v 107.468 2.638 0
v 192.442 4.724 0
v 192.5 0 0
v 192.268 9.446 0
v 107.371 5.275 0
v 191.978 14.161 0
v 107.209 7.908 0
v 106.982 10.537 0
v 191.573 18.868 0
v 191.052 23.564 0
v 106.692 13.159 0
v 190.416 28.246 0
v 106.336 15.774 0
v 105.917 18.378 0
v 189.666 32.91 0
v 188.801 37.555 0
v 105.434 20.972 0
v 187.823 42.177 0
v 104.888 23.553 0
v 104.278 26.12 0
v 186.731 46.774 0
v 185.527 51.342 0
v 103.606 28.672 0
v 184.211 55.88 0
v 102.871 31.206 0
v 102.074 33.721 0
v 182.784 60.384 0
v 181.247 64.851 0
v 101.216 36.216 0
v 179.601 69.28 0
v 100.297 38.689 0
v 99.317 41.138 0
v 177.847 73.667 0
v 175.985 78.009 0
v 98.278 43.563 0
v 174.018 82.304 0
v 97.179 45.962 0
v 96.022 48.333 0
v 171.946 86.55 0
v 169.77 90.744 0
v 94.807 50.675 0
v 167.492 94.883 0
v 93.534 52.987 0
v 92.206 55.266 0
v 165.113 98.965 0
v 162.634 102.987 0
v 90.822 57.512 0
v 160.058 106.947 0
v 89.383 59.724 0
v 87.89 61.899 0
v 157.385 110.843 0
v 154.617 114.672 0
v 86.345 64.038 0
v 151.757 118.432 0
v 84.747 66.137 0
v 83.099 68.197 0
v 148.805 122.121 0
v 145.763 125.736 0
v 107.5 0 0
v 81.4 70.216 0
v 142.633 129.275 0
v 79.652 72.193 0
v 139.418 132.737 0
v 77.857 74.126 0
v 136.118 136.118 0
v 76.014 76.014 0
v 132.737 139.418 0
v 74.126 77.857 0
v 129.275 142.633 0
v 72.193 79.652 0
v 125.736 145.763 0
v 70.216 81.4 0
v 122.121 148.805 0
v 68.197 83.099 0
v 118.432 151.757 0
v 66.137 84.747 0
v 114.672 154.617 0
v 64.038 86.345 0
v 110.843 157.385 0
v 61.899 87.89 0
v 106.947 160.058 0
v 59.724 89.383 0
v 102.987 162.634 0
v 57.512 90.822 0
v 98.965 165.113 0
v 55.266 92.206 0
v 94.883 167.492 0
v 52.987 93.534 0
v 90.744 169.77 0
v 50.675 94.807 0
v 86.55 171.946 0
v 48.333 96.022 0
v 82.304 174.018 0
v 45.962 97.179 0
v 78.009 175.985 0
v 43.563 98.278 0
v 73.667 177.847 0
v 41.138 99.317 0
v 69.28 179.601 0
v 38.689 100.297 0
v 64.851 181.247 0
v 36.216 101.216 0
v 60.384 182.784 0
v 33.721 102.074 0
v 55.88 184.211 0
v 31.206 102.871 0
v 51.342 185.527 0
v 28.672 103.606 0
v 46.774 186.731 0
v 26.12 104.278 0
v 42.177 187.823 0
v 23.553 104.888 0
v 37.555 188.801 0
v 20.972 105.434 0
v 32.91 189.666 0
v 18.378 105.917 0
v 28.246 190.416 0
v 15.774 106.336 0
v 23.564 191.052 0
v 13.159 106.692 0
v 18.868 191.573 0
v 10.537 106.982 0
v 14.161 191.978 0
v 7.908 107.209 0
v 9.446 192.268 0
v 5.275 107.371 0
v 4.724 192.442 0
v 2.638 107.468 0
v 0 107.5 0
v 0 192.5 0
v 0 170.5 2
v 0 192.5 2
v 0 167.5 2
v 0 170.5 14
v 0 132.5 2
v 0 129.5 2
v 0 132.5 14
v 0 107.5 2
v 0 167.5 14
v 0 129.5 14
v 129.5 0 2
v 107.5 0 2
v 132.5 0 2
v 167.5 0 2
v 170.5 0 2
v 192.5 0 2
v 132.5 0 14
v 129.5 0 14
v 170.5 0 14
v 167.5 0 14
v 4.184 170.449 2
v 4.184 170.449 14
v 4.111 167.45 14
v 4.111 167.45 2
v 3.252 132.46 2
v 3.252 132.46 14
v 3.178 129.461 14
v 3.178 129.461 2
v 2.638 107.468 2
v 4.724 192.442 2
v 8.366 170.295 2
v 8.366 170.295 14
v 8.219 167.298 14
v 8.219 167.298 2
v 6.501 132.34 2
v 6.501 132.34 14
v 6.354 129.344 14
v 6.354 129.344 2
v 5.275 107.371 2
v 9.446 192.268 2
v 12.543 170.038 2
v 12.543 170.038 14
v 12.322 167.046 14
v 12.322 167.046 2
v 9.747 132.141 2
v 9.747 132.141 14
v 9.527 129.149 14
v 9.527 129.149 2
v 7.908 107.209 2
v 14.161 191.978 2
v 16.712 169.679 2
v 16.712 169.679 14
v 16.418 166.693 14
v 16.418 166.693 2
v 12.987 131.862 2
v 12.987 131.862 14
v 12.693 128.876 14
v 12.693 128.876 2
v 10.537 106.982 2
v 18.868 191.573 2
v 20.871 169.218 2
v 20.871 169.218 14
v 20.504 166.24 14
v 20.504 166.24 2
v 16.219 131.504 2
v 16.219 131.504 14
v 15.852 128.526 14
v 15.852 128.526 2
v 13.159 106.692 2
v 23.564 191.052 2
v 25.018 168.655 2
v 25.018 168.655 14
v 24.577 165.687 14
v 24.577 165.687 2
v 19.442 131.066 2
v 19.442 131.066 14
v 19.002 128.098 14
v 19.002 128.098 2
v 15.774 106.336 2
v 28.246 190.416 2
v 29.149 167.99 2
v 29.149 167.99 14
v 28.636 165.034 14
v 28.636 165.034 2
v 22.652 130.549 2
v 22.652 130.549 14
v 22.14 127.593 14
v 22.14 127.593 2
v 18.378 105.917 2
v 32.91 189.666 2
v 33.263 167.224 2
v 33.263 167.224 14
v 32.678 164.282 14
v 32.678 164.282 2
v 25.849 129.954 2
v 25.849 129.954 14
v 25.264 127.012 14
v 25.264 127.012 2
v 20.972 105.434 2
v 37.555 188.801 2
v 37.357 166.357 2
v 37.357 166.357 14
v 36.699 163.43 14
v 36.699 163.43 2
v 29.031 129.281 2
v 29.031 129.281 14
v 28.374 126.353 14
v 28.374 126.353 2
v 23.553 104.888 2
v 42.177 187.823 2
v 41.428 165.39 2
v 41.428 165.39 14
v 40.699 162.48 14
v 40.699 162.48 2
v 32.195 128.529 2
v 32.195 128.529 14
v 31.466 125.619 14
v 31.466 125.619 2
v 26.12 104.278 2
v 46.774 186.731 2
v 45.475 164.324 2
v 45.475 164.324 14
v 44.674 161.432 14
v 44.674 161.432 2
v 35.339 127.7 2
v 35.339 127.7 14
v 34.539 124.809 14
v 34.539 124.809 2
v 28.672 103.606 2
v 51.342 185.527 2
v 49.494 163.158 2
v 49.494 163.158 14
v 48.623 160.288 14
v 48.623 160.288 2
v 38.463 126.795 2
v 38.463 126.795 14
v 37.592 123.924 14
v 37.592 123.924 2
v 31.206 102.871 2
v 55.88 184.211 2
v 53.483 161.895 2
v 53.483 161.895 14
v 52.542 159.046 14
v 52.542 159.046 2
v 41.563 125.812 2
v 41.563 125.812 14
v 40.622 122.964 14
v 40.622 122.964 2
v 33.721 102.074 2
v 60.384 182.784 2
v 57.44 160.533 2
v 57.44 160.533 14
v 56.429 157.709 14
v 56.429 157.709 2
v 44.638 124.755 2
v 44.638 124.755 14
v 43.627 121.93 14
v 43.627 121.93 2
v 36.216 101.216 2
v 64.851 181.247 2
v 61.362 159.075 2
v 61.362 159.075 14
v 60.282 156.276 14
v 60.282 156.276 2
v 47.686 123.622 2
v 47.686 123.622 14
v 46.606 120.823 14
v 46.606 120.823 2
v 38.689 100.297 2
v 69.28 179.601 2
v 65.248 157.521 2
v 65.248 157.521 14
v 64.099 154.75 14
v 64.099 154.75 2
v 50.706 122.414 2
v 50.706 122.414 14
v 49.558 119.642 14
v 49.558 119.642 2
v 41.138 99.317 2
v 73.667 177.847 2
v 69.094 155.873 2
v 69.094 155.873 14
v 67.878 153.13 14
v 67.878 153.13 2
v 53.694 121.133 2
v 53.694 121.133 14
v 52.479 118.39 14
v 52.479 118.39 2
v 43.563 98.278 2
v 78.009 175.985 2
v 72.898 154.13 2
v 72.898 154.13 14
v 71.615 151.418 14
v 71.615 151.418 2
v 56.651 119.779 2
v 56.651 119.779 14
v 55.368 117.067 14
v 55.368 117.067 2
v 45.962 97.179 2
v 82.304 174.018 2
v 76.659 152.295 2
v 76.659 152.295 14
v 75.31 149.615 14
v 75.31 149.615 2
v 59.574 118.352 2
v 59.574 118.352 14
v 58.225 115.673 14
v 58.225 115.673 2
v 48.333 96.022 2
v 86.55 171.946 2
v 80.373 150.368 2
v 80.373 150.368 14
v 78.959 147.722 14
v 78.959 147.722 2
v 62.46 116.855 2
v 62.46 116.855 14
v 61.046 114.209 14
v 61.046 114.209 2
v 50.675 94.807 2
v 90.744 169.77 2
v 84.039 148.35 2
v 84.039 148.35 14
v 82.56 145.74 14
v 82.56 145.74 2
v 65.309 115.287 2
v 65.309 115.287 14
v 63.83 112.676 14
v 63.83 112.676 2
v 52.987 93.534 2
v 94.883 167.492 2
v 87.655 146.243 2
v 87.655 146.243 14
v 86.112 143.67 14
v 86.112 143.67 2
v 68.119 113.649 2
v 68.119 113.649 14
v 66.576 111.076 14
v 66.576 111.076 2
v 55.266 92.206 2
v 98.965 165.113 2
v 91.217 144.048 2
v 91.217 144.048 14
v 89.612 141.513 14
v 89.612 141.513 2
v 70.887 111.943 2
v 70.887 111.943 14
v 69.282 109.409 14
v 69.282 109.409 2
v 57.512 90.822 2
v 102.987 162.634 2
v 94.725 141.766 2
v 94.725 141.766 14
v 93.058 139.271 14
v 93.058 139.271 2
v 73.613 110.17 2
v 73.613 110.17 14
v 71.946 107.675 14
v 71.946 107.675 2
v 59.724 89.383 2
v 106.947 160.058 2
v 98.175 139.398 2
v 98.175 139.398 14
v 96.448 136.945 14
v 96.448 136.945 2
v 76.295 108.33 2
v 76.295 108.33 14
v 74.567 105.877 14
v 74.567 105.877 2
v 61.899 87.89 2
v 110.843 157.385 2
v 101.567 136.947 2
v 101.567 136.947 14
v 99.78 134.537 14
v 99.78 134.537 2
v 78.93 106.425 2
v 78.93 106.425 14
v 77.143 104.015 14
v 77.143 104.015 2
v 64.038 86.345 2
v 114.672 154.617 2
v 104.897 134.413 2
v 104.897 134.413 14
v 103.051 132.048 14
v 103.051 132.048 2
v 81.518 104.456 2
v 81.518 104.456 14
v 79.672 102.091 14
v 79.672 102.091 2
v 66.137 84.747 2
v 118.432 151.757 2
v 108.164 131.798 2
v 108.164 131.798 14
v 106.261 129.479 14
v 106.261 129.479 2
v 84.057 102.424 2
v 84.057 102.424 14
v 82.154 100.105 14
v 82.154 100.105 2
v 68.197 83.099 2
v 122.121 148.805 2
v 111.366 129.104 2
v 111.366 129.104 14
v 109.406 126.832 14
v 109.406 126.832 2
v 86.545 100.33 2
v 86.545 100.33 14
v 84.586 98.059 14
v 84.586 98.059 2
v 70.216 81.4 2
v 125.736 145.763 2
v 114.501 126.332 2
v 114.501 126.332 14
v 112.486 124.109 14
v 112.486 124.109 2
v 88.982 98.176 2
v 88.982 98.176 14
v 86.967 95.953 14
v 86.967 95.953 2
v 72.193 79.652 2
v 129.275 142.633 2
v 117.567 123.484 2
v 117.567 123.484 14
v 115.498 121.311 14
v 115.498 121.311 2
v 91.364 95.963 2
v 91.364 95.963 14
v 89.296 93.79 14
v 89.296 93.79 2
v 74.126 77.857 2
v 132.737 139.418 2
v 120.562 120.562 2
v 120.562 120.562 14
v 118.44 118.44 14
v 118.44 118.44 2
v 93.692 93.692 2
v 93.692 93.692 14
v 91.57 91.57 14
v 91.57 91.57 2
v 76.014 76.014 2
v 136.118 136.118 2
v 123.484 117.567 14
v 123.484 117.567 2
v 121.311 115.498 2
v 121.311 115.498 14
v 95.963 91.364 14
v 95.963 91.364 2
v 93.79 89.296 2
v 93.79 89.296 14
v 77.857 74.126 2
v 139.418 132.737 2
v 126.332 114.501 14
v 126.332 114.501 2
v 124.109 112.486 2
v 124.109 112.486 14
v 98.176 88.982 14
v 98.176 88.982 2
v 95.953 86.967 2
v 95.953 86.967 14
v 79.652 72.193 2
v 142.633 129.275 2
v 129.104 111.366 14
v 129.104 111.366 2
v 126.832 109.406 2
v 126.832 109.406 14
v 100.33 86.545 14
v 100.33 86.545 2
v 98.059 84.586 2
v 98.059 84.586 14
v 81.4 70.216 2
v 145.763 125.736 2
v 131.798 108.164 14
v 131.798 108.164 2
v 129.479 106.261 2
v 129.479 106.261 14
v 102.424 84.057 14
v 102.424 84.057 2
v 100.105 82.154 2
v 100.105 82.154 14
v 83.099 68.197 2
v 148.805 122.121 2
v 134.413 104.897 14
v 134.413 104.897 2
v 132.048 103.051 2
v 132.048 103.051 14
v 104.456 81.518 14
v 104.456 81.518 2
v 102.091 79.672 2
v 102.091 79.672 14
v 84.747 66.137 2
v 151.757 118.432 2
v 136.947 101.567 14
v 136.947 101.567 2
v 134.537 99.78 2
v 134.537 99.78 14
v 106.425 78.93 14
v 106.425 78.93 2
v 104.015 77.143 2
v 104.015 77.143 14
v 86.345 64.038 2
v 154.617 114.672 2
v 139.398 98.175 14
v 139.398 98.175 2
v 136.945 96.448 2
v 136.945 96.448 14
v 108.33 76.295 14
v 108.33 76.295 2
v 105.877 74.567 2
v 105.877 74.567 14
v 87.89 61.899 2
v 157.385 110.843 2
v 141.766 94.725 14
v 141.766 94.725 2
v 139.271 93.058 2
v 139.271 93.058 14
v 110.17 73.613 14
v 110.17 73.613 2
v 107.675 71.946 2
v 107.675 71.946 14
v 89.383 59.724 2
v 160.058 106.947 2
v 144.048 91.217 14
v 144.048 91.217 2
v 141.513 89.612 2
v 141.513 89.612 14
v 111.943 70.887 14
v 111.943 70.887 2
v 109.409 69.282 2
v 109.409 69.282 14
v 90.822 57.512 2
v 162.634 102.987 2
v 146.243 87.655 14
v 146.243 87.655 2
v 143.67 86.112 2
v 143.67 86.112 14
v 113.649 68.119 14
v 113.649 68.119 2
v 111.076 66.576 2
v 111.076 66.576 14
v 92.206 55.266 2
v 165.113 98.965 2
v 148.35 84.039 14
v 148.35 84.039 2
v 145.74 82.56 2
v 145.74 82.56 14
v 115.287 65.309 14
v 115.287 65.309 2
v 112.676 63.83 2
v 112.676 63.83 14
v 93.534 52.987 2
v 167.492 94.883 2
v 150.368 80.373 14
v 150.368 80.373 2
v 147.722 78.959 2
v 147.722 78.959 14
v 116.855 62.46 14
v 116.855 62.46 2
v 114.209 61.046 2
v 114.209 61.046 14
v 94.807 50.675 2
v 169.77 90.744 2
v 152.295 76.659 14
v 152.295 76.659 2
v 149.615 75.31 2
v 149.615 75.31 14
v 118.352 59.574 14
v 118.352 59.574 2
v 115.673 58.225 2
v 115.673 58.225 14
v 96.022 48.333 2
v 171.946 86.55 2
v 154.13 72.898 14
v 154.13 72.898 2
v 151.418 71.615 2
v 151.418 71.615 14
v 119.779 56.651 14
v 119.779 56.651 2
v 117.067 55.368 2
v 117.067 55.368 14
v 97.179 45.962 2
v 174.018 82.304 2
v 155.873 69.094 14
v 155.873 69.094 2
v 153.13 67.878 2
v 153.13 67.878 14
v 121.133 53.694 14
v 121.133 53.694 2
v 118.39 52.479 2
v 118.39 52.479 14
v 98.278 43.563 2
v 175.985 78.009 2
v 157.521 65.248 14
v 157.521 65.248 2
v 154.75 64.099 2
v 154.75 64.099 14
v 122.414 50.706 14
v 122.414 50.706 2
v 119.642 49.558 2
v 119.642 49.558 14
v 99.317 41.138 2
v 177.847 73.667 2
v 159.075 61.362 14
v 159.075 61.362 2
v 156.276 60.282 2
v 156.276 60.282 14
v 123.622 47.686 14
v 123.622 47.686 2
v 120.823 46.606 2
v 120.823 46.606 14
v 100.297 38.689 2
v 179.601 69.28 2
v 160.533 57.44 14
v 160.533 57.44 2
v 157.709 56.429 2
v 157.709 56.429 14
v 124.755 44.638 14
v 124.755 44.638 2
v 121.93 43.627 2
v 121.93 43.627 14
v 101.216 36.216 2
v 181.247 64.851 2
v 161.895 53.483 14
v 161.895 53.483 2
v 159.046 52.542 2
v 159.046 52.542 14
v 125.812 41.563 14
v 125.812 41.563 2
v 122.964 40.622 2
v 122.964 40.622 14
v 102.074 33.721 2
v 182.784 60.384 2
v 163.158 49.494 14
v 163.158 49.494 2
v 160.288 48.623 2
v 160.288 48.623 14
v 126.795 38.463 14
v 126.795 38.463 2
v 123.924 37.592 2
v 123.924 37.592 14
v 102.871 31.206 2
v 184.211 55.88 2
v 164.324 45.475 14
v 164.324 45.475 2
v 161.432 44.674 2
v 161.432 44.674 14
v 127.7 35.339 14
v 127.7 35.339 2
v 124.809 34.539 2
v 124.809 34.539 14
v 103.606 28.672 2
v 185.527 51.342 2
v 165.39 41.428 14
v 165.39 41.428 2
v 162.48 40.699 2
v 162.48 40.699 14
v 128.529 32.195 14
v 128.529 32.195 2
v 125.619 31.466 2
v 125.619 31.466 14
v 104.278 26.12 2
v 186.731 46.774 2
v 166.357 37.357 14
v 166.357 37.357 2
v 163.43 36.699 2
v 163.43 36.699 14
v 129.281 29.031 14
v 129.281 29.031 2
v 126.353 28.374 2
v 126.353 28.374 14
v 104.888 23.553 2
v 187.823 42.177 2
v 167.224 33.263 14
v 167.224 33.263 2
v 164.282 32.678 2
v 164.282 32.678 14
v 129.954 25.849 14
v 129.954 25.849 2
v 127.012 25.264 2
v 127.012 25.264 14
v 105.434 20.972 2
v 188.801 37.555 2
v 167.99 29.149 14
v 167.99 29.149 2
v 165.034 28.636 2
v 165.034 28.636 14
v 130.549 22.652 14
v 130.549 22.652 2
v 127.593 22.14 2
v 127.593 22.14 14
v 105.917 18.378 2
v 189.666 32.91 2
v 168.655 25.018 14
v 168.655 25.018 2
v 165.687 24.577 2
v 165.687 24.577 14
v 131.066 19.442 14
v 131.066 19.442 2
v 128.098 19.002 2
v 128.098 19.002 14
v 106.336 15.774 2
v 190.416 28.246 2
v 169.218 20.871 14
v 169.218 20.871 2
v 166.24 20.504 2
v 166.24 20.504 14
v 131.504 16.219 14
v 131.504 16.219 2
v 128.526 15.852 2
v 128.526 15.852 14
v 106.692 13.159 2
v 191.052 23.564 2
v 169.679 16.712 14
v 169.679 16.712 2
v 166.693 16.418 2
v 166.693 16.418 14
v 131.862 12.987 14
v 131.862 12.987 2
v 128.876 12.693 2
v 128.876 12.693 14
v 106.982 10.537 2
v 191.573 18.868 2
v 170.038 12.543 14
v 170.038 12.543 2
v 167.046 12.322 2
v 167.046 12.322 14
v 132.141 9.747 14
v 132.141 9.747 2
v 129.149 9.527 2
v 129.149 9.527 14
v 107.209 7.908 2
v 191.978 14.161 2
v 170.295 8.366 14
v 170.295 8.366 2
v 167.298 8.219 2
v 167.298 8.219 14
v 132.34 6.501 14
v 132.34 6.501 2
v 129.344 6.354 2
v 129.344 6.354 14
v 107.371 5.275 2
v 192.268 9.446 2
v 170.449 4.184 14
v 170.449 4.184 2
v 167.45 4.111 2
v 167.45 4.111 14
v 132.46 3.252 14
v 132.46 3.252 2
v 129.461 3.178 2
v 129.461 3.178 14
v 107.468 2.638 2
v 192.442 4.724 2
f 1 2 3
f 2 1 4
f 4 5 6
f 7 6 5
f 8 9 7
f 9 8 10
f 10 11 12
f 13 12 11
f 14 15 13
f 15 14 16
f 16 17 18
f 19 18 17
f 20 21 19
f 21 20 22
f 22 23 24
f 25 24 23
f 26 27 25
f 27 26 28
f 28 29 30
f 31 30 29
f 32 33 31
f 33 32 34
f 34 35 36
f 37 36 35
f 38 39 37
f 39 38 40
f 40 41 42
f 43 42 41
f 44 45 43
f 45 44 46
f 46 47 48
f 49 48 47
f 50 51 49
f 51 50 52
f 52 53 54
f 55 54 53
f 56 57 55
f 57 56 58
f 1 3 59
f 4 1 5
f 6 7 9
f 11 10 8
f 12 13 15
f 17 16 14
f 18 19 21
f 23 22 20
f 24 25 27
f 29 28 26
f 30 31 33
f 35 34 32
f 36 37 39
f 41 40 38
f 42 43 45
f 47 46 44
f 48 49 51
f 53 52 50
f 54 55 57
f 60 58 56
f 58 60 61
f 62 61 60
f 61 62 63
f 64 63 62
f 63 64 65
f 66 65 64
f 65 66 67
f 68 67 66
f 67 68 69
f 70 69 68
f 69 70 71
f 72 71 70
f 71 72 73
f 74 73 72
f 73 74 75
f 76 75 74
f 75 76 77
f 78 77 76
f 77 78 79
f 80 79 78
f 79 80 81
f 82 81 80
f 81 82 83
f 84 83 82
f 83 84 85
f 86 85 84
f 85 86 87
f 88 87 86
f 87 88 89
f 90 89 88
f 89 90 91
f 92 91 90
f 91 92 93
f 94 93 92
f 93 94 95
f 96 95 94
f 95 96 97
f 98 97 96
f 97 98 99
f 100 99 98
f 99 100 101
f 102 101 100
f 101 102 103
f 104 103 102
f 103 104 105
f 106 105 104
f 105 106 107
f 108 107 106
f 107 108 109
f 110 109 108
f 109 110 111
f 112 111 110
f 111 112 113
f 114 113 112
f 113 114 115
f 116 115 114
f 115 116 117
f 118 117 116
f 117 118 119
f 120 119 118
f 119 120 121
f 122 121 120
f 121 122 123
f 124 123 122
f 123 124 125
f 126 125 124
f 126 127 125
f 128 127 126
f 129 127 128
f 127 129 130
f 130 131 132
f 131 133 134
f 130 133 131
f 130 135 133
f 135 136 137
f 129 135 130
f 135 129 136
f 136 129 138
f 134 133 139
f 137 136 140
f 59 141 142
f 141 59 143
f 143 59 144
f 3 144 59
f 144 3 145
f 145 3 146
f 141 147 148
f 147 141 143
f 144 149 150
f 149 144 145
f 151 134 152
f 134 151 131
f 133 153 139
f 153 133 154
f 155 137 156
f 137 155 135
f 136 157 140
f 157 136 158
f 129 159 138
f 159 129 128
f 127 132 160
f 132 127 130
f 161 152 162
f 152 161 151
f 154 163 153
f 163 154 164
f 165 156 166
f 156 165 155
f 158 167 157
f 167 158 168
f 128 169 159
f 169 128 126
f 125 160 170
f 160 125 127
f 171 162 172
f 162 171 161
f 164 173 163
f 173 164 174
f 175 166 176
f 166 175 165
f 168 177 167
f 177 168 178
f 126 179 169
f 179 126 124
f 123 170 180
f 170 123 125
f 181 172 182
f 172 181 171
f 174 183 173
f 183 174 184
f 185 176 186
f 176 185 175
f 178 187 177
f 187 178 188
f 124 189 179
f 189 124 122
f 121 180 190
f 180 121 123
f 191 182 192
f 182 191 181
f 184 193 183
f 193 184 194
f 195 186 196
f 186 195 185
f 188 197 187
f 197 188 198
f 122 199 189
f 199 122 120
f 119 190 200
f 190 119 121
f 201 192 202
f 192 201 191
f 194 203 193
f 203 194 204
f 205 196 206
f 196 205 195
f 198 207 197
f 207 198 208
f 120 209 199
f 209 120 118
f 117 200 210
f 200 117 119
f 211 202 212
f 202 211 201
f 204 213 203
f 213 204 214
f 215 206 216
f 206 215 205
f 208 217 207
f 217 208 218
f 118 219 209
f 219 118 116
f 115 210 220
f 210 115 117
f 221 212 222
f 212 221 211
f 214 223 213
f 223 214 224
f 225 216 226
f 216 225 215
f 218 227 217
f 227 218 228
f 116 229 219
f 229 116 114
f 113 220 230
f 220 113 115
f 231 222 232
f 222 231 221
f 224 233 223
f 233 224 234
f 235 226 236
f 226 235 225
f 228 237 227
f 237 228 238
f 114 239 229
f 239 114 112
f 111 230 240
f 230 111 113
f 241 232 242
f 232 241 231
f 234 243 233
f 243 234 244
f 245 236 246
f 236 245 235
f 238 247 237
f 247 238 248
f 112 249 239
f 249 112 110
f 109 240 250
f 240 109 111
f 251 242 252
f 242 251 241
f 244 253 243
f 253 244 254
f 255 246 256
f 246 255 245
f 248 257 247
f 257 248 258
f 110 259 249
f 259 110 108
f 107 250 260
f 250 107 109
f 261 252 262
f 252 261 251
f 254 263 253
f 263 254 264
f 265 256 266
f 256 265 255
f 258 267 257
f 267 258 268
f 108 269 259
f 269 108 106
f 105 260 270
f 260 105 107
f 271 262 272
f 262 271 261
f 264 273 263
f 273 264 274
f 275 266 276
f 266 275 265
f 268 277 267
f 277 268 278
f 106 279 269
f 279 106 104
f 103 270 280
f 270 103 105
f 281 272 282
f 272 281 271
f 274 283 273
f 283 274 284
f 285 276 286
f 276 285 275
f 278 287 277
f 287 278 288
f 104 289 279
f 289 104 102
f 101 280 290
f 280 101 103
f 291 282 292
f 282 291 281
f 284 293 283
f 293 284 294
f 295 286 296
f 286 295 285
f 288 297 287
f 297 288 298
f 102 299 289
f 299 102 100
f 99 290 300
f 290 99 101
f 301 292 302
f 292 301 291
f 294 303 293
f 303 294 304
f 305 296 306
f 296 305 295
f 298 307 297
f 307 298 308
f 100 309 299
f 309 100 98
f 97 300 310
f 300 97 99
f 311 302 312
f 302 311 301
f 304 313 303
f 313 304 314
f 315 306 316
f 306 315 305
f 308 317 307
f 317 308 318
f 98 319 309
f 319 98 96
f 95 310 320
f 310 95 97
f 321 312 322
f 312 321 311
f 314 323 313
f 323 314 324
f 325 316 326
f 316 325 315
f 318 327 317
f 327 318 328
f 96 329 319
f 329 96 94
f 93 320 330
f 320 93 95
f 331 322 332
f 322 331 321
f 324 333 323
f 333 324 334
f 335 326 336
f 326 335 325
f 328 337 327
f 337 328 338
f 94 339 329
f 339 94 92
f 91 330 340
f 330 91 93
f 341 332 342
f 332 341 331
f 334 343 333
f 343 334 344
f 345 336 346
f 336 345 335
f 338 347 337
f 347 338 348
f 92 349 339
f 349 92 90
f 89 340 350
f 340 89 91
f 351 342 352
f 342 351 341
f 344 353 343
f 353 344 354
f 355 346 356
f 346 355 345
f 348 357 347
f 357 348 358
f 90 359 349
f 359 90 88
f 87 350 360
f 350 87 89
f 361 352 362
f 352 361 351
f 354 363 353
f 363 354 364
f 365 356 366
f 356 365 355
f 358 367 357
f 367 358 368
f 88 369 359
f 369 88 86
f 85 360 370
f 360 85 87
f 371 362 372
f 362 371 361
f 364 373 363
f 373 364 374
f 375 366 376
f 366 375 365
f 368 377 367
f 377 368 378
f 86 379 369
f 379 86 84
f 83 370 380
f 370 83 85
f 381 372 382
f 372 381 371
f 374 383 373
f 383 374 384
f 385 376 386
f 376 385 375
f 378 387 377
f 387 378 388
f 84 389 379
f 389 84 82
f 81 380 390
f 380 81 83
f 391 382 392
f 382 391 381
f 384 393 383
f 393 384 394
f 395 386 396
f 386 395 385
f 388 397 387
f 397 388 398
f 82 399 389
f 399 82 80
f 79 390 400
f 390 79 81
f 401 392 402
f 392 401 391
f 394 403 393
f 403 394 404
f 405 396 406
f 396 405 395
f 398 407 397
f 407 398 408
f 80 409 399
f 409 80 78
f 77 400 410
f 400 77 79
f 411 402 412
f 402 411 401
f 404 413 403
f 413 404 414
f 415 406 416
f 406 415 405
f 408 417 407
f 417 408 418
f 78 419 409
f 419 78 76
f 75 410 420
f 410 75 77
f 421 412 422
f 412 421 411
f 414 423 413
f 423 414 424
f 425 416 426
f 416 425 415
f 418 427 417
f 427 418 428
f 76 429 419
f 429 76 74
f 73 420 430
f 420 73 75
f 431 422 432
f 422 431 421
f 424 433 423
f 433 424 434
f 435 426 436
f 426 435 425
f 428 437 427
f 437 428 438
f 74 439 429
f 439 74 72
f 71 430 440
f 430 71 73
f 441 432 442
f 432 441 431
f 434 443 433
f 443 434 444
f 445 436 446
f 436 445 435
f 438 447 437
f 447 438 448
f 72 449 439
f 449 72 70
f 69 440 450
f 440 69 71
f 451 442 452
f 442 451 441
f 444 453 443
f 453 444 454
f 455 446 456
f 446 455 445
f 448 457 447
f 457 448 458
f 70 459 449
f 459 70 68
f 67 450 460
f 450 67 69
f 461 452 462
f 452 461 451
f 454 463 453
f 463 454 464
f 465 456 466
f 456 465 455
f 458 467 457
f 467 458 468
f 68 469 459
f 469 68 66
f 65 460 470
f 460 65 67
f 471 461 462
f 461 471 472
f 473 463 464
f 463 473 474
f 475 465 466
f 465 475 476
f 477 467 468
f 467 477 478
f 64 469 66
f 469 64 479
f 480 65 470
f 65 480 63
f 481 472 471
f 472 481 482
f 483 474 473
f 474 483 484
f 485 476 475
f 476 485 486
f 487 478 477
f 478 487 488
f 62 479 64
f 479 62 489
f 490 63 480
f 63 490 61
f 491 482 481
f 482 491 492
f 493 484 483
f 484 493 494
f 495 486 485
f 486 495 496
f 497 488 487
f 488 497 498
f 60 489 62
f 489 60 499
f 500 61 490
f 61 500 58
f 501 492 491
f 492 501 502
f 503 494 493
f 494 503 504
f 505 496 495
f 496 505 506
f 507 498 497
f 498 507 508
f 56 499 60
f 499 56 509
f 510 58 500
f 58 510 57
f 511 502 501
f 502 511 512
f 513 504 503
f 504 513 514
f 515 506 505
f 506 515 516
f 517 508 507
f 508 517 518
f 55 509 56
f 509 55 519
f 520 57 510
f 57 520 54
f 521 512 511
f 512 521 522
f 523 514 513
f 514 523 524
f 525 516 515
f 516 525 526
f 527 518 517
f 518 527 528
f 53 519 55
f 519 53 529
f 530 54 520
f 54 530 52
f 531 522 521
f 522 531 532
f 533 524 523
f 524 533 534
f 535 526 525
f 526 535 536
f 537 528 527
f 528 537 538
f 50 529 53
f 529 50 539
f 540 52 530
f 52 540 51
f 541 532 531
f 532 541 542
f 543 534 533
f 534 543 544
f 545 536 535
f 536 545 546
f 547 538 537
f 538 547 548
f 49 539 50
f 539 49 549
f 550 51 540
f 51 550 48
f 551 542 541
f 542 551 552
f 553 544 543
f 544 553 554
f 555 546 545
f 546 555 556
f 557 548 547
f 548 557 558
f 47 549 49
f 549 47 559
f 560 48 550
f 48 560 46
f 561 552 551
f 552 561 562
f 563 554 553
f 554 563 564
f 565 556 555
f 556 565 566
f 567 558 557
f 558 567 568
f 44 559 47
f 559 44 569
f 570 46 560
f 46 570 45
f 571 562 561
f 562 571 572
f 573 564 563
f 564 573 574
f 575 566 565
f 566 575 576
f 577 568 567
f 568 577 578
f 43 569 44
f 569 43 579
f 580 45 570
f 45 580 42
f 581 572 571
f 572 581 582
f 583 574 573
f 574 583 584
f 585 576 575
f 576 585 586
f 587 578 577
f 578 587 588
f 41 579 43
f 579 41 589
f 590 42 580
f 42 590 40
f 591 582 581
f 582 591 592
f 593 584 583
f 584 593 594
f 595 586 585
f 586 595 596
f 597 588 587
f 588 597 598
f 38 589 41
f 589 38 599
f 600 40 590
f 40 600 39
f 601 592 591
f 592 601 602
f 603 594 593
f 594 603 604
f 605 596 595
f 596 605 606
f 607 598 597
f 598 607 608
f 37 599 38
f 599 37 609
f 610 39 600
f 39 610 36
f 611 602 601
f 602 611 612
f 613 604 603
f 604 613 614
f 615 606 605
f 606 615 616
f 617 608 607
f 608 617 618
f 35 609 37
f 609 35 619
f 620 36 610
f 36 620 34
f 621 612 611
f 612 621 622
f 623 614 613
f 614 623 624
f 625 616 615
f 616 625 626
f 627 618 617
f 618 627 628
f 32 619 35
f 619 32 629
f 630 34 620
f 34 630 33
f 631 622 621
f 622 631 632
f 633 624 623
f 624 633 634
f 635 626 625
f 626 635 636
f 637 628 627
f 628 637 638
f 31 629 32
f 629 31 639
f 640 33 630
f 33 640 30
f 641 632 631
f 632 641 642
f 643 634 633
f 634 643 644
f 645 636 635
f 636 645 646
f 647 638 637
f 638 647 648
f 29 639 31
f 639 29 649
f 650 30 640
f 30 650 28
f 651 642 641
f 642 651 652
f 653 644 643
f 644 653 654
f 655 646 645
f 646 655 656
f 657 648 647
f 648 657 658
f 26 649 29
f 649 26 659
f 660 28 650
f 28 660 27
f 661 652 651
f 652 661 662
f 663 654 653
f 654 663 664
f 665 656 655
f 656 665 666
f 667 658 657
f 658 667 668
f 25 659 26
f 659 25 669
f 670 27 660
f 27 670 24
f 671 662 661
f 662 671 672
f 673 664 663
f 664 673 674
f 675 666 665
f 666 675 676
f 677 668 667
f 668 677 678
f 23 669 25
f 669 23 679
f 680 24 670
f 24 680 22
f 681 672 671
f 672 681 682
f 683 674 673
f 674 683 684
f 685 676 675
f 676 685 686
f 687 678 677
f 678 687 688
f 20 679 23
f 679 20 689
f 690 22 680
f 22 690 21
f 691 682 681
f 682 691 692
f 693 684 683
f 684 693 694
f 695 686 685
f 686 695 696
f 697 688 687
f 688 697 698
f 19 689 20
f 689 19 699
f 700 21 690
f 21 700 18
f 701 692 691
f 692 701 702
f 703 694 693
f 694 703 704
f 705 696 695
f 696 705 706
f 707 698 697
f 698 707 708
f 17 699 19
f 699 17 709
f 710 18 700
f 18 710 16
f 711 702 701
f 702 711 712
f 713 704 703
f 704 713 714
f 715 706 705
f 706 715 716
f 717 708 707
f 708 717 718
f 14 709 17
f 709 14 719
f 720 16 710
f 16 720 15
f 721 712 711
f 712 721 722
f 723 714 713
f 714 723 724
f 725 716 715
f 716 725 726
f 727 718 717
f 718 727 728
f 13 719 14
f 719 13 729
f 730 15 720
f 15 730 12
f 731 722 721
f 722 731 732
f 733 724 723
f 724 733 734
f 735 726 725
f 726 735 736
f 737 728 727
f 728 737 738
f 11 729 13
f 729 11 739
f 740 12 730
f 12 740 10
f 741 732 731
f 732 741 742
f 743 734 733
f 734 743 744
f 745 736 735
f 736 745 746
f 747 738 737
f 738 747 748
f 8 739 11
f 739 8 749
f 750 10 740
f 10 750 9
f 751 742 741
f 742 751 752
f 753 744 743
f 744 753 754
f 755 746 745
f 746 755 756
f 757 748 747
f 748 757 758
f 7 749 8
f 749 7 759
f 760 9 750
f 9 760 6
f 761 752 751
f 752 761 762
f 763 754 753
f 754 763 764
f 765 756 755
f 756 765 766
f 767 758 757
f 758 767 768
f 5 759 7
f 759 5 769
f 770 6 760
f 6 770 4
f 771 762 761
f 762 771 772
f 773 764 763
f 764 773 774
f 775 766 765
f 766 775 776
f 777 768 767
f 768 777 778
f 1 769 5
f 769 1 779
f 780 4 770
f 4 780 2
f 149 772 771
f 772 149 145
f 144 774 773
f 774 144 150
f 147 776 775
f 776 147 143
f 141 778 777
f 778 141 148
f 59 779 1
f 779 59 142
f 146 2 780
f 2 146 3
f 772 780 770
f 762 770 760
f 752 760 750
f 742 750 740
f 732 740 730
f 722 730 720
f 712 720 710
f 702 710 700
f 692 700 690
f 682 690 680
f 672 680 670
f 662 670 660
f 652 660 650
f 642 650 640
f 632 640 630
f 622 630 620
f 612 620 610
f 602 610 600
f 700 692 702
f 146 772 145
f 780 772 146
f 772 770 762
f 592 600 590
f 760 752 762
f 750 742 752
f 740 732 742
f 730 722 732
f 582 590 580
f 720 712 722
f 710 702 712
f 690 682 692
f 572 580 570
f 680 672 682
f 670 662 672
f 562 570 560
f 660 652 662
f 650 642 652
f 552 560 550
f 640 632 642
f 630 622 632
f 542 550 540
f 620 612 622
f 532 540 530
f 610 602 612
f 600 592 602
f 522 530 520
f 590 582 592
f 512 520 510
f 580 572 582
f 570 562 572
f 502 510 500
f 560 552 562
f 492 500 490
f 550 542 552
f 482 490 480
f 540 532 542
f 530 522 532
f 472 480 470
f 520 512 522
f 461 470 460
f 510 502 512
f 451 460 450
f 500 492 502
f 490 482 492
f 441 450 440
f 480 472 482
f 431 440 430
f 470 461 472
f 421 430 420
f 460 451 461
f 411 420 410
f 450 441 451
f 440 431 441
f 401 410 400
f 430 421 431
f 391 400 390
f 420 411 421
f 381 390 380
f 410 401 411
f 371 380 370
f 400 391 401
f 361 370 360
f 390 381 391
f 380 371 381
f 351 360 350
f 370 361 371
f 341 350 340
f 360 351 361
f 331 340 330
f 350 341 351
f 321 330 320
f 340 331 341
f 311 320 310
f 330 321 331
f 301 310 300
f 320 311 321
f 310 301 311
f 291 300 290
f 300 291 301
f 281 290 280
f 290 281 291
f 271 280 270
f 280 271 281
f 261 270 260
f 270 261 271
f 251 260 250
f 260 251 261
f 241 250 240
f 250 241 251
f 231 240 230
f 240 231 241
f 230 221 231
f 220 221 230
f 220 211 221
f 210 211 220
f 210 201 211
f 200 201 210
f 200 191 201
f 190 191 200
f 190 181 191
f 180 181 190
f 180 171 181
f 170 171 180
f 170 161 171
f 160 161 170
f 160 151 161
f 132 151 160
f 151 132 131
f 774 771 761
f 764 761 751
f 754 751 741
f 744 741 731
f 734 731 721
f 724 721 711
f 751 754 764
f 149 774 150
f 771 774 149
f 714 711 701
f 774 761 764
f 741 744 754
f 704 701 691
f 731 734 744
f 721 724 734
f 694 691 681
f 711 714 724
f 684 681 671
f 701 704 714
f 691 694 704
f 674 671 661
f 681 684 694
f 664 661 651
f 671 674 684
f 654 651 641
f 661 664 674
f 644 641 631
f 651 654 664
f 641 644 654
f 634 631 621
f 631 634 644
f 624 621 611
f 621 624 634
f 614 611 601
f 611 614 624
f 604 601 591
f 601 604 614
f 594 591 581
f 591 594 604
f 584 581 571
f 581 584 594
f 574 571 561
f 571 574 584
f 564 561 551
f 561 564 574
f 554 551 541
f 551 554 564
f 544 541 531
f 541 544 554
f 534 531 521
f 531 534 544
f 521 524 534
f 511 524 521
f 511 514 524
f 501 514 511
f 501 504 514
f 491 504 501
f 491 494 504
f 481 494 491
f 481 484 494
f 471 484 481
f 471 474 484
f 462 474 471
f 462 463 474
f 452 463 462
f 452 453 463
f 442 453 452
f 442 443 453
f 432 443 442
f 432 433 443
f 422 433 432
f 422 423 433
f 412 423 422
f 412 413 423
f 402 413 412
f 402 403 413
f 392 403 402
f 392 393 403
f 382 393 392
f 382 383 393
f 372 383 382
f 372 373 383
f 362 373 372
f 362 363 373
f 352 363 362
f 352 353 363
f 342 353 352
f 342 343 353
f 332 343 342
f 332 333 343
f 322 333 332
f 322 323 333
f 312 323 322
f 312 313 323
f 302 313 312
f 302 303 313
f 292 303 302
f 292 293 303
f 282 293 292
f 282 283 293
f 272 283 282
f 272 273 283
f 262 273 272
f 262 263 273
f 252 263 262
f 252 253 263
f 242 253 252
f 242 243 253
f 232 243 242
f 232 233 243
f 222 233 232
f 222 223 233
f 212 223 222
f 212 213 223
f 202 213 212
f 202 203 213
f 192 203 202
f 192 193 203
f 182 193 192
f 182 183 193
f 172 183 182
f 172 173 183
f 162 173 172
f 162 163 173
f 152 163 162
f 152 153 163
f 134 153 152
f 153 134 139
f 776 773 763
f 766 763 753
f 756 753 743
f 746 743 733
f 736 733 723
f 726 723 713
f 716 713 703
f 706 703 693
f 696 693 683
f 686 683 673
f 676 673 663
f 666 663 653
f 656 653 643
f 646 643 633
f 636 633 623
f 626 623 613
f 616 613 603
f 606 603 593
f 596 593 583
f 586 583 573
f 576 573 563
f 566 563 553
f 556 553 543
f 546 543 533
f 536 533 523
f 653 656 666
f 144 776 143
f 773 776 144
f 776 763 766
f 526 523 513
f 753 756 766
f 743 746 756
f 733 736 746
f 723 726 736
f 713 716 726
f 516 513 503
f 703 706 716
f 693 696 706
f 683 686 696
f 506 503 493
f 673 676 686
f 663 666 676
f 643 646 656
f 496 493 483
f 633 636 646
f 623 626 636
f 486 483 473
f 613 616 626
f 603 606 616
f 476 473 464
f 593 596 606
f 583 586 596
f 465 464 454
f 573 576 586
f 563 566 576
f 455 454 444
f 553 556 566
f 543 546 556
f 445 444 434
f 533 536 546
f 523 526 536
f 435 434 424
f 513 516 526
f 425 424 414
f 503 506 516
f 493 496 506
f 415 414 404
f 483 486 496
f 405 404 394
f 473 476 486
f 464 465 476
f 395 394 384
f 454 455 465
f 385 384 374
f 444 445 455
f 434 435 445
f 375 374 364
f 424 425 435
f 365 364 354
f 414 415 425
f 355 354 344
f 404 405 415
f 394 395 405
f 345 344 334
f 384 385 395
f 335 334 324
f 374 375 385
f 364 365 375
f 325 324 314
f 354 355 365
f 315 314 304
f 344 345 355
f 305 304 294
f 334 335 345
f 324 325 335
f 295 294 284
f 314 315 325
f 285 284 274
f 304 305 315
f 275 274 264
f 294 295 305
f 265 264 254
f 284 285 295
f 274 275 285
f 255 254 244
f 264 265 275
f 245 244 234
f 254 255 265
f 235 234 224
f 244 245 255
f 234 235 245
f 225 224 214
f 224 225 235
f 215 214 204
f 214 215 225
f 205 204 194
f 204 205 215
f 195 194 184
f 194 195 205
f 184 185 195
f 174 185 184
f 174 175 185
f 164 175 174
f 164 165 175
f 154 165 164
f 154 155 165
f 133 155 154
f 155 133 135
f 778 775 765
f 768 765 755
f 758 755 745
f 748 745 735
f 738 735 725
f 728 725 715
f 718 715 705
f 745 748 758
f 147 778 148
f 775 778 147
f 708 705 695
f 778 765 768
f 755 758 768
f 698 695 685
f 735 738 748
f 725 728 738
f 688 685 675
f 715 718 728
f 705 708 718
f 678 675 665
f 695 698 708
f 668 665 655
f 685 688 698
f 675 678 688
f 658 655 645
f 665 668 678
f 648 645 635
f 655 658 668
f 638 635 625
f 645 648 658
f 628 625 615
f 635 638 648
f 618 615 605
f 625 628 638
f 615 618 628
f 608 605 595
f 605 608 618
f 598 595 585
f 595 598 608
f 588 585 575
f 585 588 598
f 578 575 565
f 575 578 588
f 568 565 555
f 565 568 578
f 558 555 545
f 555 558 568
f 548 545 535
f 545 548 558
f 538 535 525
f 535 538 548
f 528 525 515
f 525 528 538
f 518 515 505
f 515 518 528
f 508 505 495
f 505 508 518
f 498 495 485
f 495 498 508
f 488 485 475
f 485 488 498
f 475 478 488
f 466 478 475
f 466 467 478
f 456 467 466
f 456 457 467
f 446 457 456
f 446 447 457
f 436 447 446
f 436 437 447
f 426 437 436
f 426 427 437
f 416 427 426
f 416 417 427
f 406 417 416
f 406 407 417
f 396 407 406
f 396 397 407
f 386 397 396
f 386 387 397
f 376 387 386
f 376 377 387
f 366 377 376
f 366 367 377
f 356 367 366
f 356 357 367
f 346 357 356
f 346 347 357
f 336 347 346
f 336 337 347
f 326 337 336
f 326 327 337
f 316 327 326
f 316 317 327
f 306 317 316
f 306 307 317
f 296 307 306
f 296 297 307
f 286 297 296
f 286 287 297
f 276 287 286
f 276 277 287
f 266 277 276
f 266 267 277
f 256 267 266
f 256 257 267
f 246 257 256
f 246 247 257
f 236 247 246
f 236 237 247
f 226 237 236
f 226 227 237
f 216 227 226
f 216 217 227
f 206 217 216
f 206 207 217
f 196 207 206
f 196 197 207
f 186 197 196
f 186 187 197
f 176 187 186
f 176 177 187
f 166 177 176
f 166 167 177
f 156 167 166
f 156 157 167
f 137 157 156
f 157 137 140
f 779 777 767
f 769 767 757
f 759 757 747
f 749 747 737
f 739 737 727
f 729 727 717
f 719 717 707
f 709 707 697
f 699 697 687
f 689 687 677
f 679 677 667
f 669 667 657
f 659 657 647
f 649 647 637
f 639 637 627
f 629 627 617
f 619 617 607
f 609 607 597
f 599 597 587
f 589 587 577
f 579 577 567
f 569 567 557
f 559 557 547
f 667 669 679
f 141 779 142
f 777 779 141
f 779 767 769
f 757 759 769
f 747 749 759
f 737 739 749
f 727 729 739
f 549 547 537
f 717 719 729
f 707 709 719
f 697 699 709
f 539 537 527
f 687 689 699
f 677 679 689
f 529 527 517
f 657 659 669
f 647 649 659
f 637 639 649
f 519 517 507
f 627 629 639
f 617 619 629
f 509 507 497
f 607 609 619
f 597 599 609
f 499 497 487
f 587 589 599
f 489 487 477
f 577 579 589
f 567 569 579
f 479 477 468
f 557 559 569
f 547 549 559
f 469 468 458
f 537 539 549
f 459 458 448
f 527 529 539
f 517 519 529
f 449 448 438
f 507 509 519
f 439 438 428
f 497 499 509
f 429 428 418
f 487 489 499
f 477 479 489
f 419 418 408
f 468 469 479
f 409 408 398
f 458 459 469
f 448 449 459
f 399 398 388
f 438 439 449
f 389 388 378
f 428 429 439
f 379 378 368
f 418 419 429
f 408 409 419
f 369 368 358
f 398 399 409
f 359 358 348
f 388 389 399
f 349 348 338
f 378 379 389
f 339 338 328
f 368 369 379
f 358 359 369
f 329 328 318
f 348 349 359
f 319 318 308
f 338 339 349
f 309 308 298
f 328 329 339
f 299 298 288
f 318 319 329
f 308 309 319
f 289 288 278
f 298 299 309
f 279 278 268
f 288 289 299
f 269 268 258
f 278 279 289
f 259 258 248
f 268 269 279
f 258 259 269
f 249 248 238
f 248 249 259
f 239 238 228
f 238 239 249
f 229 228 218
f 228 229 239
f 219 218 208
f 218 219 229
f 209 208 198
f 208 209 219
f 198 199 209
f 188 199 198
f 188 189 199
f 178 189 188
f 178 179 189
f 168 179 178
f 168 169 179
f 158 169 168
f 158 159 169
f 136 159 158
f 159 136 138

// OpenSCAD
curve();

module curve()
{
    intersection()
    {
        cube([300,300,20]);
        rotate_extrude(convexity = 10, $fn=256)
        translate([150,0,0])
        polygon(points=[
                        [-42.5,0],
                        [-42.5,2],
                        [-20.5,2],
                        [-20.5,14],
                        [-17.5,14],
                        [-17.5,2],
                        [17.5,2],
                        [17.5,14],
                        [20.5,14],
                        [20.5,2],
                        [42.5,2],
                        [42.5,0]]);
    }
}

module straight()
{
    union()
    {
        translate([-40,0,1])
        cube([5,180,2], center=true);
        translate([40,0,1])
        cube([5,180,2], center=true);
        translate([-19,0,7])
        cube([3,180,14], center=true);
        translate([19,0,7])
        cube([3,180,14], center=true);
        for(i=[-2:2])
        {
            translate([0,i*(175/4),1])
            cube([80,5,2], center=true);
        }
    }
}
